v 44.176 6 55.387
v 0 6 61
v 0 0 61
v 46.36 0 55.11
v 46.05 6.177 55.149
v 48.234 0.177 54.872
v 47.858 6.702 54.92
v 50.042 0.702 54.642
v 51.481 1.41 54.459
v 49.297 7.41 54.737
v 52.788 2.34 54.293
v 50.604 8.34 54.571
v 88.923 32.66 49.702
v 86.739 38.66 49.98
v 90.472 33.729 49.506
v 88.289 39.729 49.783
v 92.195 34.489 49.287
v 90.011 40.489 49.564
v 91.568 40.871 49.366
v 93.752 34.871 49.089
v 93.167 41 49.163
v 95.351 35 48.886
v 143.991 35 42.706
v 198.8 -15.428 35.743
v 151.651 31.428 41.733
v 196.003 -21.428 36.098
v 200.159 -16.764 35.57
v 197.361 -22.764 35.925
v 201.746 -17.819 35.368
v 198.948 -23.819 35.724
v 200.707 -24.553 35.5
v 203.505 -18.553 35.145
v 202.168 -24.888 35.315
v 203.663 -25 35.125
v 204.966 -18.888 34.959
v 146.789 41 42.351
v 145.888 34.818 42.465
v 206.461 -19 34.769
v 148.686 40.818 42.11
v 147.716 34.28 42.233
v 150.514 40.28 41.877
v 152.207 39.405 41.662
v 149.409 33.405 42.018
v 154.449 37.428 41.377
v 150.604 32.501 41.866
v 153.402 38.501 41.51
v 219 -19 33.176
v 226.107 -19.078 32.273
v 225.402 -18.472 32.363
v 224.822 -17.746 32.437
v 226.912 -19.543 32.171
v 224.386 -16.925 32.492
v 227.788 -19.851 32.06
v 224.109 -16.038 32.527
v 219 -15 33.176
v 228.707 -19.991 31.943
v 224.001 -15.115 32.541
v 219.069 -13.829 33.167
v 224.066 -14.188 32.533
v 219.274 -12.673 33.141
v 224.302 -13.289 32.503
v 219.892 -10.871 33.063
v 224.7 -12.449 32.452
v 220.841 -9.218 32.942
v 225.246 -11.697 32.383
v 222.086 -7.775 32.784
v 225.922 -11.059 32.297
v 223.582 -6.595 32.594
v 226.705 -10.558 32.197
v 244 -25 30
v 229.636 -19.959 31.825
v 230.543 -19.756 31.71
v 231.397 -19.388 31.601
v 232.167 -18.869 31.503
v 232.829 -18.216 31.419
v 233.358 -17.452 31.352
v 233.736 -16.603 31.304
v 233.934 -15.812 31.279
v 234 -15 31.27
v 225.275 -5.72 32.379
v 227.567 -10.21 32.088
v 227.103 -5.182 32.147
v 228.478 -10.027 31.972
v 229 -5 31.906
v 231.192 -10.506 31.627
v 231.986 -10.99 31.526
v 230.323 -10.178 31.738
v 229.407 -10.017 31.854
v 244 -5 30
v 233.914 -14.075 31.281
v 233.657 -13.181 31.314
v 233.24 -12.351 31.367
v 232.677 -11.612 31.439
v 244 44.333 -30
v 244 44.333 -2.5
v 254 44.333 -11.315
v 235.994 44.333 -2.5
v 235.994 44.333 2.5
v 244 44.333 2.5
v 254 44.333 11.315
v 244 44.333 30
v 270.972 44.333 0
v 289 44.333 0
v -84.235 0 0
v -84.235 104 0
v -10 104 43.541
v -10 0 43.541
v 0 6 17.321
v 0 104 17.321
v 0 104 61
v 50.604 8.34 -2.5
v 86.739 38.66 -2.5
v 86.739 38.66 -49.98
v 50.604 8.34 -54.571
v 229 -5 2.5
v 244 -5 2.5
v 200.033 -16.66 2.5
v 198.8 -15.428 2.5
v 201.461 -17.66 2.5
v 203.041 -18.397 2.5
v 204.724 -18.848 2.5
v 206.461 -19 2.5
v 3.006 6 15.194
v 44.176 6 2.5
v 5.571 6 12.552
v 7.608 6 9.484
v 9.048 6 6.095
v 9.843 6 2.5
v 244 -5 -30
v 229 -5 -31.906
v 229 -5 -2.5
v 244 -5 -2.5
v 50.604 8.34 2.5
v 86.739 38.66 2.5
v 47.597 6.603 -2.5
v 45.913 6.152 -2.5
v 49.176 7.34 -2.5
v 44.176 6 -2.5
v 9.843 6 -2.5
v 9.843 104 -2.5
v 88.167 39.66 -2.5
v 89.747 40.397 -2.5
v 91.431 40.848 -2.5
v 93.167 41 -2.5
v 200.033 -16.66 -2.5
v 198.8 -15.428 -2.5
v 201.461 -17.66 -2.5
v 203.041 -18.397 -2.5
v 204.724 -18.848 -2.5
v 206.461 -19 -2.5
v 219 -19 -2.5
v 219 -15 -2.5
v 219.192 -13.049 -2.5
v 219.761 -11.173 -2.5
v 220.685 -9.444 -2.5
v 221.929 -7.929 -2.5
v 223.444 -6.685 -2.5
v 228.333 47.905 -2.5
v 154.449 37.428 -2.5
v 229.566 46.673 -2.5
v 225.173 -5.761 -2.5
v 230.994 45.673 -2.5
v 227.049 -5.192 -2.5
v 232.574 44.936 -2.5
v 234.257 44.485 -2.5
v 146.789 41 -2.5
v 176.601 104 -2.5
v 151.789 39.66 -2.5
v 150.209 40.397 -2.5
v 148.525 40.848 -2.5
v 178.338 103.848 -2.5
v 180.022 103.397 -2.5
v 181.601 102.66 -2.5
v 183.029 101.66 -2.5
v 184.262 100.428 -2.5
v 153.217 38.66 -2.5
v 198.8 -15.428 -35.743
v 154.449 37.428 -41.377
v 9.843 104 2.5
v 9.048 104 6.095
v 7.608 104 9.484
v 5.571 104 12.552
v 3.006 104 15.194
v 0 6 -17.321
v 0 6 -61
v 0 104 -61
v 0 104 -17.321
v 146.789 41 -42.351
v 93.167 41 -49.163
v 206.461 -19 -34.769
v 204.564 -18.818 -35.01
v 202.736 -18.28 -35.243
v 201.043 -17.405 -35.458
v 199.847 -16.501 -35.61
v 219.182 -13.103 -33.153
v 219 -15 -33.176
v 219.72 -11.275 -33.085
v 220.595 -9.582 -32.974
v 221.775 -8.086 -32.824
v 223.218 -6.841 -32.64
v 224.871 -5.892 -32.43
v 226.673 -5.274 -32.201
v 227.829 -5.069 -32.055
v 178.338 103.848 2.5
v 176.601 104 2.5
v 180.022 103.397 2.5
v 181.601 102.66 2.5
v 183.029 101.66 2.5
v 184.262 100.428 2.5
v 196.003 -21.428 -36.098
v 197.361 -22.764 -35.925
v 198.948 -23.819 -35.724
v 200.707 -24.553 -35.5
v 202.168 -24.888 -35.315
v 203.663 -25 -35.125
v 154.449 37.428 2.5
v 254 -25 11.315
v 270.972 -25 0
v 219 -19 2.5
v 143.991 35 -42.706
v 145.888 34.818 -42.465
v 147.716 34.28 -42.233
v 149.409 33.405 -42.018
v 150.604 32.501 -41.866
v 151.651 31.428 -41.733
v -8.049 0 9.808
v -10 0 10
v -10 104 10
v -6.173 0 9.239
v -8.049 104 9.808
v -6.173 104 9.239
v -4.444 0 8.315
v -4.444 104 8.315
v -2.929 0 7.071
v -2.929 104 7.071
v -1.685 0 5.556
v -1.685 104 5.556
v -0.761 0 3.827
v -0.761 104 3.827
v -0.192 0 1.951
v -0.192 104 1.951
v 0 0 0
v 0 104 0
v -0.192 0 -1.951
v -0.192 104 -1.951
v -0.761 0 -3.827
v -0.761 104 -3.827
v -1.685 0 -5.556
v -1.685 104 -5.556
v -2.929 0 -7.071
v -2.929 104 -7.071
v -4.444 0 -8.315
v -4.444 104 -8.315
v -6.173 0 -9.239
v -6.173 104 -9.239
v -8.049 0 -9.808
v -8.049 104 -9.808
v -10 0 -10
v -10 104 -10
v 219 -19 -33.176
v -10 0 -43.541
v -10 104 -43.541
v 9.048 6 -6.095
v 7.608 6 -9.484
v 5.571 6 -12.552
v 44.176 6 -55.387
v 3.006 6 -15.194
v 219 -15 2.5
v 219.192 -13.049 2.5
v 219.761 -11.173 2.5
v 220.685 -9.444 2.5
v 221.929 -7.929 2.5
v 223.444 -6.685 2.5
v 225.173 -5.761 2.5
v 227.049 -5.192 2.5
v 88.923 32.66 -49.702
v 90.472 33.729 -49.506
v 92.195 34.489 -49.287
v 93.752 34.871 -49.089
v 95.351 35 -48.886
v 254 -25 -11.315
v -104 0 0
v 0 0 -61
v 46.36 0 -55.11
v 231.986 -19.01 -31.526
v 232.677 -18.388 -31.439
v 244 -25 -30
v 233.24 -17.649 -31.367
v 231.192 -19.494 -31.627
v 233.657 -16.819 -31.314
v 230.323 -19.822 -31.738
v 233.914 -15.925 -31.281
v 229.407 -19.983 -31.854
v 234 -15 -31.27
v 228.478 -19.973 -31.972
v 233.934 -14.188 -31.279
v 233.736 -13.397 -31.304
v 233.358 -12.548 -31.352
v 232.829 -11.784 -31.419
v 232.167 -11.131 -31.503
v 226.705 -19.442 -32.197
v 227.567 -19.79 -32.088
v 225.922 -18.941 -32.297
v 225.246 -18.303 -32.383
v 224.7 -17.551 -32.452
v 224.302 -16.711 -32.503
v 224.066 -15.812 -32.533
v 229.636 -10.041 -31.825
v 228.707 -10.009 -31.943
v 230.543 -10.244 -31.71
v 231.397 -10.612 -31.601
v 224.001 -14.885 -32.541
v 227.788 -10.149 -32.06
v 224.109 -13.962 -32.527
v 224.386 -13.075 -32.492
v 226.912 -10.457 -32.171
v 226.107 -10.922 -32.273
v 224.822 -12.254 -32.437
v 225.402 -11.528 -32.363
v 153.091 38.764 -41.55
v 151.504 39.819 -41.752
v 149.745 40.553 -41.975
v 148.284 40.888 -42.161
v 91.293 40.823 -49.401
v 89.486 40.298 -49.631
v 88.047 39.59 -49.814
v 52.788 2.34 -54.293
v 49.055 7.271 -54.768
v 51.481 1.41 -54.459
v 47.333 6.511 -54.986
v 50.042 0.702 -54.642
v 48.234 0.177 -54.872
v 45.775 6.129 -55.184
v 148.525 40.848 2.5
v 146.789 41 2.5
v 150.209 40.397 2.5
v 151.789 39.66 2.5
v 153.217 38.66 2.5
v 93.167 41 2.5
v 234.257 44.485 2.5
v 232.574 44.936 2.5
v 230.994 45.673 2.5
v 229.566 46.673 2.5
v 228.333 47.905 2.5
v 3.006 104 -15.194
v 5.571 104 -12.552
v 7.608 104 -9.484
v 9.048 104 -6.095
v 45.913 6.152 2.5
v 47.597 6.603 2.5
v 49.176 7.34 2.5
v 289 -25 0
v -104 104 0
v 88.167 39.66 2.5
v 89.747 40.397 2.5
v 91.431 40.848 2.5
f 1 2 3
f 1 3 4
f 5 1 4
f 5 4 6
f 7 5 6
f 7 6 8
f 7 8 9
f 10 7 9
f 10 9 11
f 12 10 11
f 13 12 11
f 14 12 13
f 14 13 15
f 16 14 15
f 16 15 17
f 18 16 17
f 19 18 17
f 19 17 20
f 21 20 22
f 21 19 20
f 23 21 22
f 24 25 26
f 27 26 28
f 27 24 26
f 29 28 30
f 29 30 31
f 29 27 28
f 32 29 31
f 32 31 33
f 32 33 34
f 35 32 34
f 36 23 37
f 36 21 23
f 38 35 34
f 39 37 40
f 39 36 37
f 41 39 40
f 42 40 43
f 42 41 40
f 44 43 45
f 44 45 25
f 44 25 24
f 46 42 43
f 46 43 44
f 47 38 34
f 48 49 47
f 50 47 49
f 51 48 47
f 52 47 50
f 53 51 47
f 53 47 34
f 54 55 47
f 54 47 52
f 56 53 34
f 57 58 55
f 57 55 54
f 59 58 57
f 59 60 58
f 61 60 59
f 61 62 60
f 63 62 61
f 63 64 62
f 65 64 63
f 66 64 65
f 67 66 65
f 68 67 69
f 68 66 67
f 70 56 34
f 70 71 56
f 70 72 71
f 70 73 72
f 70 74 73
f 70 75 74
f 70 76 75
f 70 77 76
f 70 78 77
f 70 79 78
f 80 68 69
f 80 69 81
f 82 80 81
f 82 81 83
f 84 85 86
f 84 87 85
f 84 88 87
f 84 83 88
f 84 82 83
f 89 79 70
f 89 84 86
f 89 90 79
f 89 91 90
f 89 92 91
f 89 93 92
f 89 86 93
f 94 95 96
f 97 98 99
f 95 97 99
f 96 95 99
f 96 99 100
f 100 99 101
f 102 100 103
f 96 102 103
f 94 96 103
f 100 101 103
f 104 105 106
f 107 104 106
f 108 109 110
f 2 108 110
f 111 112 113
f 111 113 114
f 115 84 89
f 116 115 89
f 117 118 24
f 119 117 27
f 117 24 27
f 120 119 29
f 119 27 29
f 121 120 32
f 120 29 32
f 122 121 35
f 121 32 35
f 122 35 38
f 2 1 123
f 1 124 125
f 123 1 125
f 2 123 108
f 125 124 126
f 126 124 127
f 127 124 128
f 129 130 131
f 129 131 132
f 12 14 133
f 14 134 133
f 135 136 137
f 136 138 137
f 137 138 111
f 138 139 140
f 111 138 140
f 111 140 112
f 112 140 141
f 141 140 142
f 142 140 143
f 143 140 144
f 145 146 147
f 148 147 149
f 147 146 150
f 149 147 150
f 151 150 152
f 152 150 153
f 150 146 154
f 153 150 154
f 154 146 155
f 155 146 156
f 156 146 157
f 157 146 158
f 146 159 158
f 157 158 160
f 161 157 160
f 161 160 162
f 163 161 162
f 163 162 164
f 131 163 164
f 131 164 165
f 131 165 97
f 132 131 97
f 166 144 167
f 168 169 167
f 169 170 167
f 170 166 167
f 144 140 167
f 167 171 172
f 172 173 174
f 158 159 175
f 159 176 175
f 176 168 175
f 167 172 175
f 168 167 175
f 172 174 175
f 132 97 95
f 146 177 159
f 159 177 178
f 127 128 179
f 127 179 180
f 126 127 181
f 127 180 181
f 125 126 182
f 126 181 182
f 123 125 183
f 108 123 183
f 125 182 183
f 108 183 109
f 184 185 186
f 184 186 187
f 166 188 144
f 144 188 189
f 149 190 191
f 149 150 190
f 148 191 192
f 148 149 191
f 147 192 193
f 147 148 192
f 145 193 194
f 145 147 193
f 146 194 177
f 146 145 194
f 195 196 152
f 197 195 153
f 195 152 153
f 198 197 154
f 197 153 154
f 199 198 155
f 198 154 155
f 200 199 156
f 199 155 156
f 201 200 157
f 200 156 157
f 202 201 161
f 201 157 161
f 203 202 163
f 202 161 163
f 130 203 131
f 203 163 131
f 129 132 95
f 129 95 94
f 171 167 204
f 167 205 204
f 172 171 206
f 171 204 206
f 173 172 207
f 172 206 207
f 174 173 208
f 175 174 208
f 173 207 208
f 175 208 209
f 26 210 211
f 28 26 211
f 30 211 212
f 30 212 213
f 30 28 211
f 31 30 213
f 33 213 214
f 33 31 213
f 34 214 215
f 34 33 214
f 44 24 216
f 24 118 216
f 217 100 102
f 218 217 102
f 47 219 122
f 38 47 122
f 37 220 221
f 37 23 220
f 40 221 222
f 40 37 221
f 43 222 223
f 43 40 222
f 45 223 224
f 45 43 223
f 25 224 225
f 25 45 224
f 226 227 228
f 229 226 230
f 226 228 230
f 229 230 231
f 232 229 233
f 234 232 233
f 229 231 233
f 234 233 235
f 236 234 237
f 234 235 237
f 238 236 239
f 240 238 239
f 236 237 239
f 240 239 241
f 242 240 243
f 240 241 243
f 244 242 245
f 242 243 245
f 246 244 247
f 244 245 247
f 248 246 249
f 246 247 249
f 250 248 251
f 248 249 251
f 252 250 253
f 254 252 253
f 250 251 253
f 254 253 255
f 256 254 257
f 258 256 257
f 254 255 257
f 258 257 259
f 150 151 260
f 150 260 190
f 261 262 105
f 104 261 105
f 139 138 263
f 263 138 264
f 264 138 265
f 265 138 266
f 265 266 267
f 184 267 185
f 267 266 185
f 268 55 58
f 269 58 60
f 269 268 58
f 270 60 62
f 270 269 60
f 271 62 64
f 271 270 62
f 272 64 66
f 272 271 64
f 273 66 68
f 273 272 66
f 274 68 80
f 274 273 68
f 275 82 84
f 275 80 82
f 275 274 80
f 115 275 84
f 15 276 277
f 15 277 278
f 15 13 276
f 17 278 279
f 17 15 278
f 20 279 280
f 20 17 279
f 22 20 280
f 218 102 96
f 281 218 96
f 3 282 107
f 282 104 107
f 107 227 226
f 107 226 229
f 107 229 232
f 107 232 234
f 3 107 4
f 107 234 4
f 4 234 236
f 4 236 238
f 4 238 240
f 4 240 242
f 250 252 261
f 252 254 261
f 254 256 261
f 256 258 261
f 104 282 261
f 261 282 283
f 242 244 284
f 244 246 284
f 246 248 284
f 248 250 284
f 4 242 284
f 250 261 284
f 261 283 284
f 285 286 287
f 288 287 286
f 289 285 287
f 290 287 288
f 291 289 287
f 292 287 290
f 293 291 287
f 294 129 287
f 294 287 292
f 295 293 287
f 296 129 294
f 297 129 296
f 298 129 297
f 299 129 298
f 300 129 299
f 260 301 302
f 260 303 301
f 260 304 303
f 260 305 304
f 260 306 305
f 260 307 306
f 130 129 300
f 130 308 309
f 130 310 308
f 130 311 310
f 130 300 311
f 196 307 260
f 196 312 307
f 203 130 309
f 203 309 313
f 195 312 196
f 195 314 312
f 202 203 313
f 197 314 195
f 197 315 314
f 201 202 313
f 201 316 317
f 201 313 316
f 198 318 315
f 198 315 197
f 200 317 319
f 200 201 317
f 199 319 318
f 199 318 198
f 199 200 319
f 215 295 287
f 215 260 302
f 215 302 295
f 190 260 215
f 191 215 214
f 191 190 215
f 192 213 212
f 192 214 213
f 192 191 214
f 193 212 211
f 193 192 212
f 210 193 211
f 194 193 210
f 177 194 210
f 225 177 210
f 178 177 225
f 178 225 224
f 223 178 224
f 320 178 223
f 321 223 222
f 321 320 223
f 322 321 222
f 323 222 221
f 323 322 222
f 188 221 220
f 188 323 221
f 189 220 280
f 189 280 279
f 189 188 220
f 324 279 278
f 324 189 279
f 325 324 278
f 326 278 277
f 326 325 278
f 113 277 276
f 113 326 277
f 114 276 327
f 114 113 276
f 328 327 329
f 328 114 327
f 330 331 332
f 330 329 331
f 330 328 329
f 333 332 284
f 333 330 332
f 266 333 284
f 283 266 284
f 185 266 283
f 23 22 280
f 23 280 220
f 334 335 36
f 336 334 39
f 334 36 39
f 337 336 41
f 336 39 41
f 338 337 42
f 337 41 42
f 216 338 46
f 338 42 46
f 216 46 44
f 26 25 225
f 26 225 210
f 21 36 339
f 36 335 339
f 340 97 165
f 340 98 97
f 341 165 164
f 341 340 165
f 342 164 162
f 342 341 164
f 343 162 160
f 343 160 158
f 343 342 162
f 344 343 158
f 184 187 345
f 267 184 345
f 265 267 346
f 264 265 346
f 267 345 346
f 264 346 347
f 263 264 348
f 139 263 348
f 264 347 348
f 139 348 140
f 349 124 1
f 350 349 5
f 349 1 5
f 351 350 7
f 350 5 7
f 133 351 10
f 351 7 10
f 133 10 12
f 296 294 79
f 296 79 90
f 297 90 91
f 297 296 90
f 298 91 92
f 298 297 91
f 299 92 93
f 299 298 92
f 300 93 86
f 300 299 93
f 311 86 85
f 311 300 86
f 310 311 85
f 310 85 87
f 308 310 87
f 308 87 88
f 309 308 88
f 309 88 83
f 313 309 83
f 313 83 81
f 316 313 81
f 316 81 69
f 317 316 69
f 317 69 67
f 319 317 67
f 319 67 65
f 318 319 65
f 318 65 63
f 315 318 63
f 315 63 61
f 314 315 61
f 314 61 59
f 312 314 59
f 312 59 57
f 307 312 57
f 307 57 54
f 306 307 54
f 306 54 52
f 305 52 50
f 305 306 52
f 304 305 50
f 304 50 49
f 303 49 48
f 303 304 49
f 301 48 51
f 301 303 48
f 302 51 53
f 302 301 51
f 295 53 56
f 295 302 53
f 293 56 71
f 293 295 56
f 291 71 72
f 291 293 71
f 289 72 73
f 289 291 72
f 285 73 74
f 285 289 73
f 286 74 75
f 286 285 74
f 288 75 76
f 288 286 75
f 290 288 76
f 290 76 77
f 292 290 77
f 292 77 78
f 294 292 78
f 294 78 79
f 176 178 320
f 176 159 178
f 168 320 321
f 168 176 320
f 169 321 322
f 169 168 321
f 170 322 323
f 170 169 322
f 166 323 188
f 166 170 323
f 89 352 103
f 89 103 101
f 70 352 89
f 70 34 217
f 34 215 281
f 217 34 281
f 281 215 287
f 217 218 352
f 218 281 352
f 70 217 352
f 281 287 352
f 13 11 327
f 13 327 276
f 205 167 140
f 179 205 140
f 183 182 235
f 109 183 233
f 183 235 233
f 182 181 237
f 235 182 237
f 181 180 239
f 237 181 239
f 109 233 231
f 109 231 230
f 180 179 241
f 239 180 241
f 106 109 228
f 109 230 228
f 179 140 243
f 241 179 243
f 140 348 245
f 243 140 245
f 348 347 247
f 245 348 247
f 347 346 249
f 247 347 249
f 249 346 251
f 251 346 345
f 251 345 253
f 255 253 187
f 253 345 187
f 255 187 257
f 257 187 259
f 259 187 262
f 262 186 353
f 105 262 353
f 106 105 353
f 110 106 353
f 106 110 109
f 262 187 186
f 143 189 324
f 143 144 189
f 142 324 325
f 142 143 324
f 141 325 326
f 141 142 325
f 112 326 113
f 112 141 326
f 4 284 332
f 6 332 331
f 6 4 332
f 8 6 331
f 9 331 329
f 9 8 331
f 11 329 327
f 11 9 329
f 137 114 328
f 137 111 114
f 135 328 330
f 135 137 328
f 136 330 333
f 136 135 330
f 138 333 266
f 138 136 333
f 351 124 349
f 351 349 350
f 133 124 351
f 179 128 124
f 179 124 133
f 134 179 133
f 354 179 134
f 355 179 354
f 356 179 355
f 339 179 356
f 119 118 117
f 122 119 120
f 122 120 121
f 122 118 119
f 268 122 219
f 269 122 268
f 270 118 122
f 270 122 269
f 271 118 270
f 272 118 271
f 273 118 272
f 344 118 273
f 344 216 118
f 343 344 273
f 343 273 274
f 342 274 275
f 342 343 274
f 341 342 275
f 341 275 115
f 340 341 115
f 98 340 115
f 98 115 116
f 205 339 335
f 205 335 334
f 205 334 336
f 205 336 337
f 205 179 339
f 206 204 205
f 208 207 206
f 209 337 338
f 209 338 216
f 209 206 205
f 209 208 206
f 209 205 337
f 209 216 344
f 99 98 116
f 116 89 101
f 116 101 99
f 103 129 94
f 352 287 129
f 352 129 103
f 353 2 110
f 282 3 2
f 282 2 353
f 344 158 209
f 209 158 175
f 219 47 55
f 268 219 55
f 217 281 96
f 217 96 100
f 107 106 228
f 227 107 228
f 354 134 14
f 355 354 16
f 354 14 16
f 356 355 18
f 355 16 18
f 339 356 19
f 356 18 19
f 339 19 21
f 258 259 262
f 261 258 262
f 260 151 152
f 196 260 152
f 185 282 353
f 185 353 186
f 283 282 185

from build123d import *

# Parameters (mm, degrees)
EXTRUDE_1_DEPTH             = 104
EXTRUDE_1_2_DEPTH           = 61
EXTRUDE_1_2_DEPTH_BACK      = 61
EXTRUDE_5_DEPTH             = 69.333333333
CUT_EXTRUDE_5_DEPTH         = 320.954684291
CUT_EXTRUDE_5_DEPTH_BACK    = 320.954684291
SKETCH_13_OUTSIDE_W         = 481.25
SKETCH_13_OUTSIDE_H         = 210.25
RIB_START                   = -2.5
RIB_2_DEPTH                 = 5
FILLET_1_R                  = 10
EXTRUDE_7_REACH             = 315.142
EXTRUDE_7_DIRECTION_2_REACH = 315.142
CUT_EXTRUDE_3_DEPTH         = 314.142140249
CUT_EXTRUDE_3_DEPTH_BACK    = 314.142140249
SKETCH_10_R                 = 5
EXTRUDE_8_DEPTH             = 98
CUT_EXTRUDE_6_DEPTH         = 323.308858085


# Read off the part's stored shape, not the designer's step: 보강대2
with BuildPart() as part:
    # 스케치1 → Extrude 1 (new body)
    with BuildSketch(Plane(origin=(0, 0, 0), x_dir=(1, 0, 0), z_dir=(0, 1, 0))):
        Polygon((0, 61), (0, -61), (-104, 0), align=None)
        Polygon((-10, 43.541395957), (-84.234511141, 0), (-10, -43.541395957), align=None, mode=Mode.SUBTRACT)
    extrude(amount=EXTRUDE_1_DEPTH)


with BuildPart() as body_2:
    # 스케치3 → Extrude 1 2 (new, two sides: drawn at the far end of the back side and taken through both)
    with BuildSketch(Plane.XY.offset(-EXTRUDE_1_2_DEPTH_BACK)):
        Polygon((0, 0), (50, 0), (91.711375741, 35), (148.654022129, 35), (199, -25), (244, -25), (244, -19), (201.797845949, -19), (151.451868078, 41), (89.527554335, 41), (47.816178594, 6), (0, 6), align=None)
    extrude(amount=EXTRUDE_1_2_DEPTH + EXTRUDE_1_2_DEPTH_BACK)

    # 스케치13 outside → 컷-돌출5 (cut, two sides: drawn at the far end of the back side and taken through both)
    with BuildSketch(Plane(origin=(0, -19, 0), x_dir=(1, 0, 0), z_dir=(0, 1, 0)).offset(-CUT_EXTRUDE_5_DEPTH_BACK)):
        with Locations((92.5, 0)):
            Rectangle(SKETCH_13_OUTSIDE_W, SKETCH_13_OUTSIDE_H)
        Polygon((0, 61), (244, 30), (244, -30), (0, -61), align=None, mode=Mode.SUBTRACT)
    extrude(amount=CUT_EXTRUDE_5_DEPTH + CUT_EXTRUDE_5_DEPTH_BACK, mode=Mode.SUBTRACT)


with BuildPart() as body_3:
    # 스케치12 → 보스-돌출5 (new body)
    with BuildSketch(Plane.XZ.offset(25)):
        Polygon((244, 30), (244, -30), (289, 0), align=None)
        Polygon((254, 11.314829082), (270.972243623, 0), (254, -11.314829082), align=None, mode=Mode.SUBTRACT)
    extrude(amount=-EXTRUDE_5_DEPTH)


with BuildPart() as part_1:
    add(part.part)

    # Combine 1: union body 3, body 2
    add(body_3.part)
    add(body_2.part)

    # 보강대2 outline → 보강대2 (add)
    with BuildSketch(Plane.XY.offset(RIB_START)):
        Polygon((231.330664299, 44.333333333), (181.264386305, 104), (0, 104), (0, 6), (47.816178594, 6), (89.527554335, 41), (151.451868078, 41), (201.797845949, -19), (244, -19), (244, 44.333333333), align=None)
    extrude(amount=RIB_2_DEPTH)

    # 필렛1
    fillet_1_edges = [part_1.edges().sort_by_distance(p)[0] for p in [
        (181.264386305, 104, 0),
        (199, -25, 0),
        (201.797845949, -19, 18.93087454),
        (151.451868078, 41, 22.129082151),
        (89.527554335, 41, 26.062798802),
        (47.816178594, 6, 28.712496852),
        (50, 0, 0),
        (91.711375741, 35, 0),
        (148.654022129, 35, 0),
        (47.816178594, 6, -28.712496852),
        (89.527554335, 41, -26.062798802),
        (151.451868078, 41, -22.129082151),
        (201.797845949, -19, -18.93087454),
        (231.330664299, 44.333333333, 0),
    ]]
    fillet(fillet_1_edges, radius=FILLET_1_R)

    # 보스-돌출7: up to this plane
    extrude_7_end = Plane(origin=(244, -25, 30), z_dir=(0.12603604726758494, 0, 0.9920256623642169))
    # 스케치9 → 보스-돌출7 (add, up to the surface)
    with BuildSketch(Plane.XY, mode=Mode.PRIVATE) as extrude_7_sk1:
        with BuildLine():
            Line((244, -19), (219, -19))
            Line((219, -19), (219, -15))
            ThreePointArc((219, -15), (221.928932188, -7.928932188), (229, -5))
            Line((229, -5), (244, -5))
            Line((244, -5), (244, -19))
        make_face()
    extrude_7_tool1 = split(extrude(extrude_7_sk1.sketch, amount=EXTRUDE_7_REACH, mode=Mode.PRIVATE), bisect_by=extrude_7_end, keep=Keep.BOTH, mode=Mode.PRIVATE)
    add(extrude_7_tool1.solids().sort_by_distance((232.170595, -12.311336, 0))[0])

    # 보스-돌출7 direction 2: up to this plane
    extrude_7_direction_2_end = Plane(origin=(0, -25, -61), z_dir=(0.12603604726758494, 0, -0.9920256623642169))
    # 스케치9 → 보스-돌출7 direction 2 (add, up to the surface)
    with BuildSketch(Plane.XY, mode=Mode.PRIVATE) as extrude_7_direction_2_sk1:
        with BuildLine():
            Line((244, -19), (219, -19))
            Line((219, -19), (219, -15))
            ThreePointArc((219, -15), (221.928932188, -7.928932188), (229, -5))
            Line((229, -5), (244, -5))
            Line((244, -5), (244, -19))
        make_face()
    extrude_7_direction_2_tool1 = split(extrude(extrude_7_direction_2_sk1.sketch, amount=-EXTRUDE_7_DIRECTION_2_REACH, mode=Mode.PRIVATE), bisect_by=extrude_7_direction_2_end, keep=Keep.BOTH, mode=Mode.PRIVATE)
    add(extrude_7_direction_2_tool1.solids().sort_by_distance((232.170595, -12.311336, 0))[0])

    # 스케치10 → 컷-돌출3 (cut, two sides: drawn at the far end of the back side and taken through both)
    with BuildSketch(Plane.XY.offset(-CUT_EXTRUDE_3_DEPTH_BACK)):
        with Locations((229, -15)):
            Circle(SKETCH_10_R)
    extrude(amount=CUT_EXTRUDE_3_DEPTH + CUT_EXTRUDE_3_DEPTH_BACK, mode=Mode.SUBTRACT)

    # 스케치14 → 보스-돌출8 (add)
    with BuildSketch(Plane(origin=(0, 104, 0), x_dir=(1, 0, 0), z_dir=(0, 1, 0))):
        with BuildLine():
            Line((-10, -20), (-10, -10))
            ThreePointArc((-10, -10), (0, 0), (-10, 10))
            Line((-10, 10), (-10, 20))
            ThreePointArc((-10, 20), (10, 0), (-10, -20))
        make_face()
    extrude(amount=-EXTRUDE_8_DEPTH)

    # 스케치14<2> → 컷-돌출6 (cut, through all)
    with BuildSketch(Plane(origin=(0, 104, 0), x_dir=(1, 0, 0), z_dir=(0, 1, 0))):
        with BuildLine():
            Line((-10, 10), (-10, -10))
            ThreePointArc((-10, -10), (0, 0), (-10, 10))
        make_face()
    extrude(amount=-CUT_EXTRUDE_6_DEPTH, mode=Mode.SUBTRACT)


solid = part_1.part
